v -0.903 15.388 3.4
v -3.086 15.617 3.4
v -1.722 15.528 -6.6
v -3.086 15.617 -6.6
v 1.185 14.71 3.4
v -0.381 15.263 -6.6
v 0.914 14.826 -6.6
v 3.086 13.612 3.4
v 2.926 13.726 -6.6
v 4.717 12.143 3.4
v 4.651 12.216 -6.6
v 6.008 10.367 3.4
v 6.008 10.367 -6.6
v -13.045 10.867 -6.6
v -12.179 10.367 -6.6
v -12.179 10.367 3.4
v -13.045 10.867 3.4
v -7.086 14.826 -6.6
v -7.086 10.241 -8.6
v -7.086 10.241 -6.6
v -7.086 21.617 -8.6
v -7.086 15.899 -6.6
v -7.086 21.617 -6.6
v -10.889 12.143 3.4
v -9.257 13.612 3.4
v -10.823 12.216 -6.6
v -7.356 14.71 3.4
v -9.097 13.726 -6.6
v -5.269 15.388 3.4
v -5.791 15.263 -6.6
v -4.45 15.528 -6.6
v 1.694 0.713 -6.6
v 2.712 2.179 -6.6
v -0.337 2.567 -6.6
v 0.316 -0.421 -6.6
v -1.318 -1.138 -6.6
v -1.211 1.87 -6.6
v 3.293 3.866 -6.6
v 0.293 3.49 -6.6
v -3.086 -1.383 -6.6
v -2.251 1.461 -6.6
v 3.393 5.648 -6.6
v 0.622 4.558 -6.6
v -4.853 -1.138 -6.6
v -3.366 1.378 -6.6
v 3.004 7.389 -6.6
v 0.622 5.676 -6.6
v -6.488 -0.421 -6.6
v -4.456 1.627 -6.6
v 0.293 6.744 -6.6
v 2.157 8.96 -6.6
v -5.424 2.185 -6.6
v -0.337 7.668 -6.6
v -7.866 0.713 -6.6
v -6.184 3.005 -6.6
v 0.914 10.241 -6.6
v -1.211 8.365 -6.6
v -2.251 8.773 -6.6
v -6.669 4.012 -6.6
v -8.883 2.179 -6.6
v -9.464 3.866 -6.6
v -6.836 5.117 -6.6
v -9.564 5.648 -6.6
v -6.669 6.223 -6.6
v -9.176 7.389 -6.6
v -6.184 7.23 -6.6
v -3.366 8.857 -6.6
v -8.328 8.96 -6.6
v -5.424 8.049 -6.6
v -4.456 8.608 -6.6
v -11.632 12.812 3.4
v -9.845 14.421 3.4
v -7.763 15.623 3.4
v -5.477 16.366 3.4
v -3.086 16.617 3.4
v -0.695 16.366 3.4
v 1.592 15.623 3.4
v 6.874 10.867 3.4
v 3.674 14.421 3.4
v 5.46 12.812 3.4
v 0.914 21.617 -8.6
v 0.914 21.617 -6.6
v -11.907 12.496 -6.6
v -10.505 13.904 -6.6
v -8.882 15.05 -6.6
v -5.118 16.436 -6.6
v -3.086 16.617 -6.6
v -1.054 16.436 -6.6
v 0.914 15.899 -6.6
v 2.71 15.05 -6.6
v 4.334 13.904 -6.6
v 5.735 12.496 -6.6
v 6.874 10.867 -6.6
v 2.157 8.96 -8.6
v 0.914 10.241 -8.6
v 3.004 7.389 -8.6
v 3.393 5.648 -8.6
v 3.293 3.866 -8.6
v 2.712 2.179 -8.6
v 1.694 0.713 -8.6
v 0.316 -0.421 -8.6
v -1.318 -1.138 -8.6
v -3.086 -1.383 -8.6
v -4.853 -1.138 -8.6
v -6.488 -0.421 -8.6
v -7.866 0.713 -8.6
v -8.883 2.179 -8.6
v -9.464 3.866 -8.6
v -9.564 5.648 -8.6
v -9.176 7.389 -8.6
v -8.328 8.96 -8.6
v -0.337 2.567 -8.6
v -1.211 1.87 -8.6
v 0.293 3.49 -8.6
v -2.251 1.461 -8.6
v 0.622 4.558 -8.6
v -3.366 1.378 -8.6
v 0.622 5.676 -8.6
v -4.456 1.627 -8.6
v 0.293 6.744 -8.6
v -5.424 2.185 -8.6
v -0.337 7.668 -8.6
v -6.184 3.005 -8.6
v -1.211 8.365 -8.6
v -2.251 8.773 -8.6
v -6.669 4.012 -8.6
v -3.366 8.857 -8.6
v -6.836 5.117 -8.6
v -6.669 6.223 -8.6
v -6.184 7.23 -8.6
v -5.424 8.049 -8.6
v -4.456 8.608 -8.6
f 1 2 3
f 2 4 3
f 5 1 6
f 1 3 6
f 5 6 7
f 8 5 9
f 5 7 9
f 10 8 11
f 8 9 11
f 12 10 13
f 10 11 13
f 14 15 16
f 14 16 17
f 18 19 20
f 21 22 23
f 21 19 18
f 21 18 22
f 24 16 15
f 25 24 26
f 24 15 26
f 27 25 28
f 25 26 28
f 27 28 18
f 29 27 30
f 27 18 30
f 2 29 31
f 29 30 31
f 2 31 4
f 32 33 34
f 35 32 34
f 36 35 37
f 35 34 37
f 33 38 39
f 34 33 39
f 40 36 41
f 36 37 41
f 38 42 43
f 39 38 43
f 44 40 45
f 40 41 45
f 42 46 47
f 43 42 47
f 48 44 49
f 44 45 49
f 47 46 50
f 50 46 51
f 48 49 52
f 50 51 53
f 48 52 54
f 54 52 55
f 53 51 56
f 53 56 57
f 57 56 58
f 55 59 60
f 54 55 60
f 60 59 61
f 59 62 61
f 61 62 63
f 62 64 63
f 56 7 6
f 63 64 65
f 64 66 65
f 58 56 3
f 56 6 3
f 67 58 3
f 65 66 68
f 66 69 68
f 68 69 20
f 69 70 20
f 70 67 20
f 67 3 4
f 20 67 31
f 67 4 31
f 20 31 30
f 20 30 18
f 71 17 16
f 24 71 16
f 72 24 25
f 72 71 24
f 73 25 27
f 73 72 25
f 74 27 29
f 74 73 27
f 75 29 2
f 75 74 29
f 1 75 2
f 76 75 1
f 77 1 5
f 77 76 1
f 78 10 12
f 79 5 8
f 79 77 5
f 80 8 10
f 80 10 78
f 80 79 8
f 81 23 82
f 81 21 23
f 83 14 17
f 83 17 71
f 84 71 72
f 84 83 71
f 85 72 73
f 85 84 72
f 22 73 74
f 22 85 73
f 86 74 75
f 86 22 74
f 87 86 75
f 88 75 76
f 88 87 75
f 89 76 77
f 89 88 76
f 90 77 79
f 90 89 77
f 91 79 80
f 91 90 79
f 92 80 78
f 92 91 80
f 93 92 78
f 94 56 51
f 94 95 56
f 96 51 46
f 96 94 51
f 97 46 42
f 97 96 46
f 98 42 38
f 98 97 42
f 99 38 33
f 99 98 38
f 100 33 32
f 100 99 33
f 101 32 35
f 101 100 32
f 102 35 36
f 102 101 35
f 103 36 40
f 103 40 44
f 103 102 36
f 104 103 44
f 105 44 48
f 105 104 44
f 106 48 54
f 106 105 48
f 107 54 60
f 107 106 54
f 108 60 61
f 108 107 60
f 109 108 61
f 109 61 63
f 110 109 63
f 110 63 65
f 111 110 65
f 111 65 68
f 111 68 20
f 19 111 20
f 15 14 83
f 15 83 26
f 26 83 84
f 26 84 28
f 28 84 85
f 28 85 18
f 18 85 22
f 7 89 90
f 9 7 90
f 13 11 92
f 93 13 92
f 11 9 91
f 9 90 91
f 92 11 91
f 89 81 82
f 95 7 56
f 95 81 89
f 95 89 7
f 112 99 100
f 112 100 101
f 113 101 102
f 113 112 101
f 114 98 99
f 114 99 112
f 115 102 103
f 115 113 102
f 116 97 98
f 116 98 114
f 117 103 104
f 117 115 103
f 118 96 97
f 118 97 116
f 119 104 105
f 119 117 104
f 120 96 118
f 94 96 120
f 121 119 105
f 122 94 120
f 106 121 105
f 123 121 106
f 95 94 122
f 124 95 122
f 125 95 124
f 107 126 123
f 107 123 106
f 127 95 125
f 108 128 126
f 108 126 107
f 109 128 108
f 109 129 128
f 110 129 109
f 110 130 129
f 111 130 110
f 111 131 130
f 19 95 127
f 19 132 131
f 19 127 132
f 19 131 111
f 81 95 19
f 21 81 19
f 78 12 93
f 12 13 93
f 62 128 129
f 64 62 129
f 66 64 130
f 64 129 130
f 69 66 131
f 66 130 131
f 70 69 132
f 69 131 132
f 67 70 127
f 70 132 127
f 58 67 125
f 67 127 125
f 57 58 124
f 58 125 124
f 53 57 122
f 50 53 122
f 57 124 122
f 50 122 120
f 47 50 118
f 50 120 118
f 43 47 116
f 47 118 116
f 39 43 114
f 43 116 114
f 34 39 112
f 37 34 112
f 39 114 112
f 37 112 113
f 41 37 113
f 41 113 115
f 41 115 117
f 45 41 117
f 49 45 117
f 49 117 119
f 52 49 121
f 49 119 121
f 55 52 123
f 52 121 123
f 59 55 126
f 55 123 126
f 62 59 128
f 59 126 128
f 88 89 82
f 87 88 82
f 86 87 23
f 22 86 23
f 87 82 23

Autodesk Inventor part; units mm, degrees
ref_plane "YZ Plane" through (0, 0, 0) normal (1, 0, 0) x (0, 1, 0)
ref_plane "XZ Plane" through (0, 0, 0) normal (0, 1, 0) x (-1, 0, 0)
ref_plane "Work Plane1" through (0, 0, -6.6) normal (0, 0, -1) x (-1, 0, 0)
sketch "Sketch1" plane through (0, 0, -6.6) normal (0, 0, -1) x (-1, 0, 0)
  circle A0 centre (3.0857, 5.1173) radius 10 projected
  line L0 (-6.9143, 5.1173) -> (-6.9143, 18.1173)
  line L1 (-6.9143, 18.1173) -> (13.0857, 18.1173)
  line L2 (13.0857, 18.1173) -> (13.0857, 5.1173)
  circle A1 centre (0, 0) radius 5
  point P0 (0, 0)
  dimension "d24" = 13
  dimension "d25" = 20
ref_plane "Work Plane2" through (-10, -10, -4.4) normal (0, 0, 1) x (1, 0, 0)
extrude "Extrusion1" add sketch "Sketch1" along normal blind 2 contours A0 A1 | A0 L0 L1 L2 | A0 A1 picked at (6.1055, 10.6249) picked at (0.8611, -2.5748)
sketch "Sketch9" plane through (0, 0, -8.6) normal (0, 0, -1) x (-1, 0, 0)
  circle A0 centre (3.0857, 5.1173) radius 5 construction
  arc A1 (-6.9143, 5.1173) -> (13.0857, 5.1173) centre (3.0857, 5.1173) ccw projected
  circle A2 centre (3.0857, 5.1173) radius 3.75
  dimension "d43" = 7.5
extrude "Extrusion6" cut sketch "Sketch9" against normal up to surface (2 mm away)
sketch "Sketch10" plane through (0, 0, -8.6) normal (0, 0, -1) x (-1, 0, 0)
  arc A0 (-6.9143, 5.1173) -> (13.0857, 5.1173) centre (3.0857, 5.1173) ccw projected
  line L0 (3.0857, -4.8827) -> (3.0857, -2.8827)
  line L1 (3.0857, -2.8827) -> (4.5857, -2.8827)
  line L2 (4.5857, -2.8827) -> (3.0857, -2.8827)
  line L3 (-2.1325, -2.8827) -> (-2.1325, -5.7607)
  line L4 (4.5857, -2.8827) -> (4.5857, -3.3119)
  line L5 (-2.1325, -5.7607) -> (-2.1325, -7.2943)
  line L6 (4.5857, -3.3119) -> (4.5857, -2.7408)
  line L7 (-4, 15) -> (-4, 13) construction
  line L8 (4, 13) -> (4, 15) construction
  line L9 (13.0857, 18.1173) -> (-6.9143, 18.1173) projected
  line L10 (-6.9143, 18.1173) -> (13.0857, 18.1173)
  line L11 (-6.9143, 18.1173) -> (-6.9143, 5.1173)
  line L12 (13.0857, 18.1173) -> (13.0857, 5.1173)
  arc A1 (-6.9143, 5.1173) -> (13.0857, 5.1173) centre (3.0857, 5.1173) ccw
  circle A2 centre (3.0857, 5.1173) radius 6.5
  line L13 (3.0857, 5.1173) -> (3.0857, 11.6173) construction
  line L14 (3.0857, 11.6173) -> (7.0857, 11.6173)
  line L15 (7.0857, 11.6173) -> (3.0857, 11.6173)
  line L16 (3.0857, 11.6173) -> (-0.9143, 11.6173)
  line L17 (-0.9143, 10.2408) -> (-0.9143, 18.1173)
  line L18 (-0.9143, 18.1173) -> (7.0857, 18.1173)
  line L19 (7.0857, 18.1173) -> (7.0857, 10.2408)
  point P0 (5.6921, -0.9362)
  dimension "d31" = 2
  dimension "d37" = 1.5
  dimension "d44" = 4
  dimension "d45" = 4
extrude "Extrusion8" cut sketch "Sketch10" against normal up to next contours A0 L11 L9 L17 A2 L19 L12
sketch "Sketch11" plane through (0, 0, -8.6) normal (0, 0, -1) x (-1, 0, 0)
  line L0 (7.0857, 18.1173) -> (-0.9143, 18.1173) projected
  line L1 (7.0857, 18.1173) -> (7.0857, 21.6173)
  line L2 (7.0857, 21.6173) -> (-0.9143, 21.6173)
  line L3 (-0.9143, 21.6173) -> (-0.9143, 18.1173)
  point P0 (0, 0)
  dimension "d46" = 3.5
extrude "Extrusion9" add sketch "Sketch11" against normal up to surface (2 mm away)
sketch "Sketch13" plane through (0, 0, -6.6) normal (0, 0, 1) x (1, 0, 0)
  circle A0 centre (-3.0857, 5.1173) radius 3.75 projected
  arc A1 (6.0076, 10.3673) -> (-3.0857, 15.6173) centre (-3.0857, 5.1173) ccw
  line L0 (-3.0857, 5.1173) -> (6.0076, 10.3673) construction
  arc A2 (-3.0857, 15.6173) -> (-12.1789, 10.3673) centre (-3.0857, 5.1173) ccw
  line L1 (-3.0857, 5.1173) -> (-12.1789, 10.3673) construction
  arc A3 (6.0076, 10.3673) -> (-12.1789, 10.3673) centre (-3.0857, 5.1173) ccw
  arc A4 (6.8736, 10.8673) -> (-13.045, 10.8673) centre (-3.0857, 5.1173) ccw
  line L2 (-12.1789, 10.3673) -> (-13.045, 10.8673)
  line L3 (6.0076, 10.3673) -> (6.8736, 10.8673)
  arc A5 (-7.0857, 10.2408) -> (0.9143, 10.2408) centre (-3.0857, 5.1173) ccw projected
  line L4 (-3.0857, 5.1173) -> (-3.0857, 15.6173)
  point P0 (0, 0)
  point P1 (-3.0857, 16.6173)
  dimension "d60" = 120
  dimension "d61" = 11.5
  dimension "d65" = 10.5
  dimension "d66" = 1
extrude "Extrusion11" add sketch "Sketch13" along normal blind 10 contours A2 L2 A4 L3 A1
equation "\"d60\" = 2 * d56"
equation "\"d56\" = 60deg"
